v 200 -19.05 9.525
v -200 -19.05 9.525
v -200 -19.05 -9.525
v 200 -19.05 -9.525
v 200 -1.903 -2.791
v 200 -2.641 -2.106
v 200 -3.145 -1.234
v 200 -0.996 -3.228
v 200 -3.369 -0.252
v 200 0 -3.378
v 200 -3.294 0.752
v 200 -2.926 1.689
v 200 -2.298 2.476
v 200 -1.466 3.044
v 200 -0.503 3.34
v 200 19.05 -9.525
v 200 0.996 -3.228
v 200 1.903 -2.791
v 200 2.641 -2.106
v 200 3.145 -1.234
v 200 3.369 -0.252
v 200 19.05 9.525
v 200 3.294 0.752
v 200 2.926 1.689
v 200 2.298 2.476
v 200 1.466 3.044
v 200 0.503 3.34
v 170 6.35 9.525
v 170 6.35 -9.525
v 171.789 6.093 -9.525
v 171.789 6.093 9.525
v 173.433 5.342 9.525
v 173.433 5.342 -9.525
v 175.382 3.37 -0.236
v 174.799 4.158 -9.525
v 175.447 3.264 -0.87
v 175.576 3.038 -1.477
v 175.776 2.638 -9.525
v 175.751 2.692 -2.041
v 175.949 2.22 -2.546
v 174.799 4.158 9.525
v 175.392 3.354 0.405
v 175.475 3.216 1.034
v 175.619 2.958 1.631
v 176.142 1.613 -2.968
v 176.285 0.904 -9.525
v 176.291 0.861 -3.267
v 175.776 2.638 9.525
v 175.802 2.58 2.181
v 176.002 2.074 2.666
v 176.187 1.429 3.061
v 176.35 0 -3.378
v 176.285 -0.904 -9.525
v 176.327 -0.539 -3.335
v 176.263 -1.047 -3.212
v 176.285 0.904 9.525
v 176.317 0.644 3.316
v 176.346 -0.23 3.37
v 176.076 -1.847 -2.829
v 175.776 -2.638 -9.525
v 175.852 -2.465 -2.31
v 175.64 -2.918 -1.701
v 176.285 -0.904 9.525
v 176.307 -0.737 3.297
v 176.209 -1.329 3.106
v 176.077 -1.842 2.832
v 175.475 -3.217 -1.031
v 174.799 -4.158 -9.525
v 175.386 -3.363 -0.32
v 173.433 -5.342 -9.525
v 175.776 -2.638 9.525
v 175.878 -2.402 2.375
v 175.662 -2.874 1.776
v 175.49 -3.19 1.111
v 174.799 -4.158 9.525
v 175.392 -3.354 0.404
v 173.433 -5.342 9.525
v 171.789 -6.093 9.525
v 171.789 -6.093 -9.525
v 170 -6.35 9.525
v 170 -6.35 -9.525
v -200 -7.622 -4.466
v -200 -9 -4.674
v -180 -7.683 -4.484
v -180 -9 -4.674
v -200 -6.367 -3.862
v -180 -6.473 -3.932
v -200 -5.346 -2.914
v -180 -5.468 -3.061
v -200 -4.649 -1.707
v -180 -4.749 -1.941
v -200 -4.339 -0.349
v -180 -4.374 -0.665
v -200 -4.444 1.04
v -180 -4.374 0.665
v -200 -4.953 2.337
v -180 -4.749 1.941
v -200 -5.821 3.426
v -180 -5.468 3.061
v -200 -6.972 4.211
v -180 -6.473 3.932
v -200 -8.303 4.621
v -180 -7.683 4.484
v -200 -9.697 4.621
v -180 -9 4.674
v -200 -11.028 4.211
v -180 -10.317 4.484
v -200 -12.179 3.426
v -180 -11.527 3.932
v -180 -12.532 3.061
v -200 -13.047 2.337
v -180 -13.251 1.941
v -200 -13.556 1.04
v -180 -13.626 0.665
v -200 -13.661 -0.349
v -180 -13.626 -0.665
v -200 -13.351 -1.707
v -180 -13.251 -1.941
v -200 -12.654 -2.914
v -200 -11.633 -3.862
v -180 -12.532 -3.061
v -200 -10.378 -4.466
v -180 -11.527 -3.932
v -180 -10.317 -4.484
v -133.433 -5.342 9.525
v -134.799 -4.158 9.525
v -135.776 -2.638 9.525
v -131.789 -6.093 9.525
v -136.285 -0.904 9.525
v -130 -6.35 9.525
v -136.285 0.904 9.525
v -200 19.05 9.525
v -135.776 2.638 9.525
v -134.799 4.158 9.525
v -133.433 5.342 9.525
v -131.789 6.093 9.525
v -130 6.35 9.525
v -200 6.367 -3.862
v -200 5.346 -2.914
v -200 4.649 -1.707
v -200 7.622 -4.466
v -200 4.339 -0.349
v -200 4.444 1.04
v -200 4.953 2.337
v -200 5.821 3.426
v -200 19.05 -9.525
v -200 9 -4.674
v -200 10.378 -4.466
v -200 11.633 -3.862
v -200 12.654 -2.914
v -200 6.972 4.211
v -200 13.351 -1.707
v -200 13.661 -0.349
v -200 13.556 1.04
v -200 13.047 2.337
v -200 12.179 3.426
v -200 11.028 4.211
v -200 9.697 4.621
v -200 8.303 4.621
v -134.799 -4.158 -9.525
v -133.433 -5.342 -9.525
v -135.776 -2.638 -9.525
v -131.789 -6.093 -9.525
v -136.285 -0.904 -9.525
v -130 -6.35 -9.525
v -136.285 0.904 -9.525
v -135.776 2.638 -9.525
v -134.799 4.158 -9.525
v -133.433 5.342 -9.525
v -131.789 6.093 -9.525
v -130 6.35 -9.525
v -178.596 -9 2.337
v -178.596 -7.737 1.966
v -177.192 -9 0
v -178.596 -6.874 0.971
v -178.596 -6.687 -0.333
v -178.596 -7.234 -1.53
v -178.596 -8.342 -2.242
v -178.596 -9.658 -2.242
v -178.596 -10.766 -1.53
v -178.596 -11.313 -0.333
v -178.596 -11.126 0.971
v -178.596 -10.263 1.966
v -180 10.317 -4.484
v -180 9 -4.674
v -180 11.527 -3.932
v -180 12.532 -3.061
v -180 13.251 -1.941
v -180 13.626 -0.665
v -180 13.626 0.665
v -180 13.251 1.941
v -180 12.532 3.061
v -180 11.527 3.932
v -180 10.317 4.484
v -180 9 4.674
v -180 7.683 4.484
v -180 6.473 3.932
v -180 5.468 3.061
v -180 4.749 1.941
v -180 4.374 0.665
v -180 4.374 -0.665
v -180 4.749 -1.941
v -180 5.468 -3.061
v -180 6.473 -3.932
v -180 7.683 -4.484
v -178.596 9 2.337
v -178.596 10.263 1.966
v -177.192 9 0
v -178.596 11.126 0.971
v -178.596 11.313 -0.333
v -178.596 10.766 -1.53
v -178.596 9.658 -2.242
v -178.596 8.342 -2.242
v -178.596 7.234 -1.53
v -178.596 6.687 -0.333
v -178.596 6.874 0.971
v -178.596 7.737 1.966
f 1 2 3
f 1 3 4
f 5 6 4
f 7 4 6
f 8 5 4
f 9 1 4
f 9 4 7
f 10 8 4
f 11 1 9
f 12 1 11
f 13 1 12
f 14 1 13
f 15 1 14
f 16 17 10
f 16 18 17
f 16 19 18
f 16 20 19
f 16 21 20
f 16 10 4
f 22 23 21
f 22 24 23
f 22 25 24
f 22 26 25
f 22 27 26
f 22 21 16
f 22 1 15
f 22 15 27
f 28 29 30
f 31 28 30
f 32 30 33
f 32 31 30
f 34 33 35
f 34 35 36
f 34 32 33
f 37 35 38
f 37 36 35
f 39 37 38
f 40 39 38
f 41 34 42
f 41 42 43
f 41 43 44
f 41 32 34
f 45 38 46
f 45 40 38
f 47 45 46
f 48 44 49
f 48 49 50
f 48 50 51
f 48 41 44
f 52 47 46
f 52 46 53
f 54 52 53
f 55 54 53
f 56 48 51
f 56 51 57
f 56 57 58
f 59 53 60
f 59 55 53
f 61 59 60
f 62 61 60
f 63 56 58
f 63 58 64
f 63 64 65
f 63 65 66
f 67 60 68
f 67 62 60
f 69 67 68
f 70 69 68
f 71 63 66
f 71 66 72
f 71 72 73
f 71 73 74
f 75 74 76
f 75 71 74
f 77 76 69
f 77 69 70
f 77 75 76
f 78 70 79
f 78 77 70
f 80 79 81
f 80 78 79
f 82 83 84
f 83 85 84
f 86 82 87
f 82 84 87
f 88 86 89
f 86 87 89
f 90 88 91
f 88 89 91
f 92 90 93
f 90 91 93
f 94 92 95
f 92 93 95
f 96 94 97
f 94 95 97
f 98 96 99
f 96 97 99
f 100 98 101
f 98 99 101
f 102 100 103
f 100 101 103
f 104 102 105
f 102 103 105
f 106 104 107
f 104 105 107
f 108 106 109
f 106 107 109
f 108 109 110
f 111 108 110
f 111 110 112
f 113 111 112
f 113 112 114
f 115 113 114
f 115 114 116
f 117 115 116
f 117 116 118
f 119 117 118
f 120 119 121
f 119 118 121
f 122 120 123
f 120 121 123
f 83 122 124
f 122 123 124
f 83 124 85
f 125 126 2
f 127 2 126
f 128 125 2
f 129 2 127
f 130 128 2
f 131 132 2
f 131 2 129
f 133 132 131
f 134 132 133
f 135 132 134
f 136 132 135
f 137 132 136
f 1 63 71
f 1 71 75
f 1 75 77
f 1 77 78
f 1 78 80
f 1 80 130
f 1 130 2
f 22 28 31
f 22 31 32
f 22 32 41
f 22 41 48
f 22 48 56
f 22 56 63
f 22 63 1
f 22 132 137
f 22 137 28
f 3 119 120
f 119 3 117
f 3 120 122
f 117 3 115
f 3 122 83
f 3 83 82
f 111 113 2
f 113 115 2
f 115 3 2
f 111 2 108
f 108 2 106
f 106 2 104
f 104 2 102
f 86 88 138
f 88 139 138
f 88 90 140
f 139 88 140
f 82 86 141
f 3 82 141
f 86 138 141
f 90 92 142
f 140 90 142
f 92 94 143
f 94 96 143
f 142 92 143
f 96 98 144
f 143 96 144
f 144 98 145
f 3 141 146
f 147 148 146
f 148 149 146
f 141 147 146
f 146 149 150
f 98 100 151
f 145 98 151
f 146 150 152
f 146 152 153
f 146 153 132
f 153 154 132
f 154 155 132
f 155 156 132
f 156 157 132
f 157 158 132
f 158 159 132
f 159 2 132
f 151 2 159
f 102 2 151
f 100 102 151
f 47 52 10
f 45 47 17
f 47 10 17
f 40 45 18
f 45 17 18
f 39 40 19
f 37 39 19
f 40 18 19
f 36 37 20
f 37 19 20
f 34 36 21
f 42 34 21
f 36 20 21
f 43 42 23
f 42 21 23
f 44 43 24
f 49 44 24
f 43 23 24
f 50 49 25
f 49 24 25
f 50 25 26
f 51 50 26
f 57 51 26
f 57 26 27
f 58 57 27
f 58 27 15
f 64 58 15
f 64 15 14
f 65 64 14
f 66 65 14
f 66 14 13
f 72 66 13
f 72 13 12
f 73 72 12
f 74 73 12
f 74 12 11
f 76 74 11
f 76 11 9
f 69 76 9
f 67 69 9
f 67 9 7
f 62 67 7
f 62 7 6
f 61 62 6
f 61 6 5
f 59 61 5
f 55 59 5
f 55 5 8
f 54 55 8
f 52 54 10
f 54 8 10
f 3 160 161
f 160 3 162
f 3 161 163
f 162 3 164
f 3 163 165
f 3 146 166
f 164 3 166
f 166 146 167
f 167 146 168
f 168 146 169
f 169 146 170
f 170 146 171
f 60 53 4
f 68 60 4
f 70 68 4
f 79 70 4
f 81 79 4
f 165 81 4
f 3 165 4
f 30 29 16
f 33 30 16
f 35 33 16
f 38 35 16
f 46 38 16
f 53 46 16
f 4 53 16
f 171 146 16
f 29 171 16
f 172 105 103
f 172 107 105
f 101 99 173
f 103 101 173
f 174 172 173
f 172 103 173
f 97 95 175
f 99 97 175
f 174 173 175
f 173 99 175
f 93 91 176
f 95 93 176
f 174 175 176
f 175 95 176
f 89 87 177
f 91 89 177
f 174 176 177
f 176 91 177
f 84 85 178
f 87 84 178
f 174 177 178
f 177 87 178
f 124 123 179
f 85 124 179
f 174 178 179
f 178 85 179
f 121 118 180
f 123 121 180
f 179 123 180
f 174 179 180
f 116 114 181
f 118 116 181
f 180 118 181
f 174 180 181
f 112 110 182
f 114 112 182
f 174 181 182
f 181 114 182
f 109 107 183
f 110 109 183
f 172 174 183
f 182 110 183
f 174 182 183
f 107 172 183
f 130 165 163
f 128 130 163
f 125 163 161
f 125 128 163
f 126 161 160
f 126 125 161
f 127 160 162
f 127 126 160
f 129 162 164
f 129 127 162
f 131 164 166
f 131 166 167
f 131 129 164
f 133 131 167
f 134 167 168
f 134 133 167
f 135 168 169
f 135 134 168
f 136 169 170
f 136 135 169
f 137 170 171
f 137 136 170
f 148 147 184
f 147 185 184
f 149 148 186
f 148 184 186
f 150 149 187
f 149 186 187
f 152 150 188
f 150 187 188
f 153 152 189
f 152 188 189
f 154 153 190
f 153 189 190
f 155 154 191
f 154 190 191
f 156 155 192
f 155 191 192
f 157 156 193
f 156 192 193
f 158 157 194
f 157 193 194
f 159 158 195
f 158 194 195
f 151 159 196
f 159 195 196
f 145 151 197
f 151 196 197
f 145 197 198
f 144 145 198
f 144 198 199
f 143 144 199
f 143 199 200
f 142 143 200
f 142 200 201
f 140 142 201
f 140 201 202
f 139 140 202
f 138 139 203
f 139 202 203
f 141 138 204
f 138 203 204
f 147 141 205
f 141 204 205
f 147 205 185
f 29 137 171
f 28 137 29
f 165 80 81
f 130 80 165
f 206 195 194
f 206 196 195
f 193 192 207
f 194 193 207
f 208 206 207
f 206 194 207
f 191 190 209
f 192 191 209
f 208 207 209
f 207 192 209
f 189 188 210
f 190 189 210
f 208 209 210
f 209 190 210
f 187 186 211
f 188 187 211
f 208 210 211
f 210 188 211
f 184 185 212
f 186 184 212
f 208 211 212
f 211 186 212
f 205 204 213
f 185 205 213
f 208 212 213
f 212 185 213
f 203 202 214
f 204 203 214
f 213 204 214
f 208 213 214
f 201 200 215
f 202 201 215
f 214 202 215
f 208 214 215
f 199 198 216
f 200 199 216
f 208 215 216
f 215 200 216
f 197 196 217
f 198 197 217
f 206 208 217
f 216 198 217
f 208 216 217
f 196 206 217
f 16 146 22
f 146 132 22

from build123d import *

# Parameters (mm, degrees)
CROQUIS1_W                         = 400
CROQUIS1_H                         = 38.1
SALIENTE_EXTRUIR1_DEPTH            = 9.525
TALADRO_DE_MARGEN_PARA_1_41_REACH  = 402.567
TALADRO_DE_MARGEN_PARA_1_41_BORE_R = 3.3782
TALADRO_ROSCADO_7_16_141_D         = 9.3472
TALADRO_ROSCADO_7_16_141_DEPTH     = 20
TALADRO_ROSCADO_7_16_141_TIP       = 2.808182189


with BuildPart() as part:
    # Croquis1 → Saliente-Extruir1 (new, symmetric)
    with BuildSketch(Plane.XY):
        Rectangle(CROQUIS1_W, CROQUIS1_H)
        with BuildLine():
            Line((-130, 6.35), (170, 6.35))
            ThreePointArc((170, 6.35), (176.35, 0), (170, -6.35))
            Line((170, -6.35), (-130, -6.35))
            ThreePointArc((-130, -6.35), (-136.35, 0), (-130, 6.35))
        make_face(mode=Mode.SUBTRACT)
    extrude(amount=SALIENTE_EXTRUIR1_DEPTH, both=True)

    # Taladro de margen para 1/41 bore → Taladro de margen para 1/41 (cut, up to next)
    with BuildSketch(Plane(origin=(200, 0, 0), x_dir=(0, 0, -1), z_dir=(1, 0, 0)), mode=Mode.PRIVATE) as taladro_de_margen_para_1_41_sk1:
        Circle(TALADRO_DE_MARGEN_PARA_1_41_BORE_R)
    taladro_de_margen_para_1_41_tool1 = extrude(taladro_de_margen_para_1_41_sk1.sketch, amount=-TALADRO_DE_MARGEN_PARA_1_41_REACH, mode=Mode.PRIVATE) & part.part
    add(taladro_de_margen_para_1_41_tool1.solids().sort_by_distance((200, 0, 0))[0], mode=Mode.SUBTRACT)

    # Taladro roscado 7/16-141
    with Locations(Plane.ZY.offset(200)):
        with Locations((0, 9), (0, -9)):
            Hole(TALADRO_ROSCADO_7_16_141_D / 2, depth=TALADRO_ROSCADO_7_16_141_DEPTH)
            with Locations((0, 0, -(TALADRO_ROSCADO_7_16_141_DEPTH + TALADRO_ROSCADO_7_16_141_TIP / 2))):  # 118° drill point
                Cone(0, TALADRO_ROSCADO_7_16_141_D / 2, TALADRO_ROSCADO_7_16_141_TIP, mode=Mode.SUBTRACT)


solid = part.part
